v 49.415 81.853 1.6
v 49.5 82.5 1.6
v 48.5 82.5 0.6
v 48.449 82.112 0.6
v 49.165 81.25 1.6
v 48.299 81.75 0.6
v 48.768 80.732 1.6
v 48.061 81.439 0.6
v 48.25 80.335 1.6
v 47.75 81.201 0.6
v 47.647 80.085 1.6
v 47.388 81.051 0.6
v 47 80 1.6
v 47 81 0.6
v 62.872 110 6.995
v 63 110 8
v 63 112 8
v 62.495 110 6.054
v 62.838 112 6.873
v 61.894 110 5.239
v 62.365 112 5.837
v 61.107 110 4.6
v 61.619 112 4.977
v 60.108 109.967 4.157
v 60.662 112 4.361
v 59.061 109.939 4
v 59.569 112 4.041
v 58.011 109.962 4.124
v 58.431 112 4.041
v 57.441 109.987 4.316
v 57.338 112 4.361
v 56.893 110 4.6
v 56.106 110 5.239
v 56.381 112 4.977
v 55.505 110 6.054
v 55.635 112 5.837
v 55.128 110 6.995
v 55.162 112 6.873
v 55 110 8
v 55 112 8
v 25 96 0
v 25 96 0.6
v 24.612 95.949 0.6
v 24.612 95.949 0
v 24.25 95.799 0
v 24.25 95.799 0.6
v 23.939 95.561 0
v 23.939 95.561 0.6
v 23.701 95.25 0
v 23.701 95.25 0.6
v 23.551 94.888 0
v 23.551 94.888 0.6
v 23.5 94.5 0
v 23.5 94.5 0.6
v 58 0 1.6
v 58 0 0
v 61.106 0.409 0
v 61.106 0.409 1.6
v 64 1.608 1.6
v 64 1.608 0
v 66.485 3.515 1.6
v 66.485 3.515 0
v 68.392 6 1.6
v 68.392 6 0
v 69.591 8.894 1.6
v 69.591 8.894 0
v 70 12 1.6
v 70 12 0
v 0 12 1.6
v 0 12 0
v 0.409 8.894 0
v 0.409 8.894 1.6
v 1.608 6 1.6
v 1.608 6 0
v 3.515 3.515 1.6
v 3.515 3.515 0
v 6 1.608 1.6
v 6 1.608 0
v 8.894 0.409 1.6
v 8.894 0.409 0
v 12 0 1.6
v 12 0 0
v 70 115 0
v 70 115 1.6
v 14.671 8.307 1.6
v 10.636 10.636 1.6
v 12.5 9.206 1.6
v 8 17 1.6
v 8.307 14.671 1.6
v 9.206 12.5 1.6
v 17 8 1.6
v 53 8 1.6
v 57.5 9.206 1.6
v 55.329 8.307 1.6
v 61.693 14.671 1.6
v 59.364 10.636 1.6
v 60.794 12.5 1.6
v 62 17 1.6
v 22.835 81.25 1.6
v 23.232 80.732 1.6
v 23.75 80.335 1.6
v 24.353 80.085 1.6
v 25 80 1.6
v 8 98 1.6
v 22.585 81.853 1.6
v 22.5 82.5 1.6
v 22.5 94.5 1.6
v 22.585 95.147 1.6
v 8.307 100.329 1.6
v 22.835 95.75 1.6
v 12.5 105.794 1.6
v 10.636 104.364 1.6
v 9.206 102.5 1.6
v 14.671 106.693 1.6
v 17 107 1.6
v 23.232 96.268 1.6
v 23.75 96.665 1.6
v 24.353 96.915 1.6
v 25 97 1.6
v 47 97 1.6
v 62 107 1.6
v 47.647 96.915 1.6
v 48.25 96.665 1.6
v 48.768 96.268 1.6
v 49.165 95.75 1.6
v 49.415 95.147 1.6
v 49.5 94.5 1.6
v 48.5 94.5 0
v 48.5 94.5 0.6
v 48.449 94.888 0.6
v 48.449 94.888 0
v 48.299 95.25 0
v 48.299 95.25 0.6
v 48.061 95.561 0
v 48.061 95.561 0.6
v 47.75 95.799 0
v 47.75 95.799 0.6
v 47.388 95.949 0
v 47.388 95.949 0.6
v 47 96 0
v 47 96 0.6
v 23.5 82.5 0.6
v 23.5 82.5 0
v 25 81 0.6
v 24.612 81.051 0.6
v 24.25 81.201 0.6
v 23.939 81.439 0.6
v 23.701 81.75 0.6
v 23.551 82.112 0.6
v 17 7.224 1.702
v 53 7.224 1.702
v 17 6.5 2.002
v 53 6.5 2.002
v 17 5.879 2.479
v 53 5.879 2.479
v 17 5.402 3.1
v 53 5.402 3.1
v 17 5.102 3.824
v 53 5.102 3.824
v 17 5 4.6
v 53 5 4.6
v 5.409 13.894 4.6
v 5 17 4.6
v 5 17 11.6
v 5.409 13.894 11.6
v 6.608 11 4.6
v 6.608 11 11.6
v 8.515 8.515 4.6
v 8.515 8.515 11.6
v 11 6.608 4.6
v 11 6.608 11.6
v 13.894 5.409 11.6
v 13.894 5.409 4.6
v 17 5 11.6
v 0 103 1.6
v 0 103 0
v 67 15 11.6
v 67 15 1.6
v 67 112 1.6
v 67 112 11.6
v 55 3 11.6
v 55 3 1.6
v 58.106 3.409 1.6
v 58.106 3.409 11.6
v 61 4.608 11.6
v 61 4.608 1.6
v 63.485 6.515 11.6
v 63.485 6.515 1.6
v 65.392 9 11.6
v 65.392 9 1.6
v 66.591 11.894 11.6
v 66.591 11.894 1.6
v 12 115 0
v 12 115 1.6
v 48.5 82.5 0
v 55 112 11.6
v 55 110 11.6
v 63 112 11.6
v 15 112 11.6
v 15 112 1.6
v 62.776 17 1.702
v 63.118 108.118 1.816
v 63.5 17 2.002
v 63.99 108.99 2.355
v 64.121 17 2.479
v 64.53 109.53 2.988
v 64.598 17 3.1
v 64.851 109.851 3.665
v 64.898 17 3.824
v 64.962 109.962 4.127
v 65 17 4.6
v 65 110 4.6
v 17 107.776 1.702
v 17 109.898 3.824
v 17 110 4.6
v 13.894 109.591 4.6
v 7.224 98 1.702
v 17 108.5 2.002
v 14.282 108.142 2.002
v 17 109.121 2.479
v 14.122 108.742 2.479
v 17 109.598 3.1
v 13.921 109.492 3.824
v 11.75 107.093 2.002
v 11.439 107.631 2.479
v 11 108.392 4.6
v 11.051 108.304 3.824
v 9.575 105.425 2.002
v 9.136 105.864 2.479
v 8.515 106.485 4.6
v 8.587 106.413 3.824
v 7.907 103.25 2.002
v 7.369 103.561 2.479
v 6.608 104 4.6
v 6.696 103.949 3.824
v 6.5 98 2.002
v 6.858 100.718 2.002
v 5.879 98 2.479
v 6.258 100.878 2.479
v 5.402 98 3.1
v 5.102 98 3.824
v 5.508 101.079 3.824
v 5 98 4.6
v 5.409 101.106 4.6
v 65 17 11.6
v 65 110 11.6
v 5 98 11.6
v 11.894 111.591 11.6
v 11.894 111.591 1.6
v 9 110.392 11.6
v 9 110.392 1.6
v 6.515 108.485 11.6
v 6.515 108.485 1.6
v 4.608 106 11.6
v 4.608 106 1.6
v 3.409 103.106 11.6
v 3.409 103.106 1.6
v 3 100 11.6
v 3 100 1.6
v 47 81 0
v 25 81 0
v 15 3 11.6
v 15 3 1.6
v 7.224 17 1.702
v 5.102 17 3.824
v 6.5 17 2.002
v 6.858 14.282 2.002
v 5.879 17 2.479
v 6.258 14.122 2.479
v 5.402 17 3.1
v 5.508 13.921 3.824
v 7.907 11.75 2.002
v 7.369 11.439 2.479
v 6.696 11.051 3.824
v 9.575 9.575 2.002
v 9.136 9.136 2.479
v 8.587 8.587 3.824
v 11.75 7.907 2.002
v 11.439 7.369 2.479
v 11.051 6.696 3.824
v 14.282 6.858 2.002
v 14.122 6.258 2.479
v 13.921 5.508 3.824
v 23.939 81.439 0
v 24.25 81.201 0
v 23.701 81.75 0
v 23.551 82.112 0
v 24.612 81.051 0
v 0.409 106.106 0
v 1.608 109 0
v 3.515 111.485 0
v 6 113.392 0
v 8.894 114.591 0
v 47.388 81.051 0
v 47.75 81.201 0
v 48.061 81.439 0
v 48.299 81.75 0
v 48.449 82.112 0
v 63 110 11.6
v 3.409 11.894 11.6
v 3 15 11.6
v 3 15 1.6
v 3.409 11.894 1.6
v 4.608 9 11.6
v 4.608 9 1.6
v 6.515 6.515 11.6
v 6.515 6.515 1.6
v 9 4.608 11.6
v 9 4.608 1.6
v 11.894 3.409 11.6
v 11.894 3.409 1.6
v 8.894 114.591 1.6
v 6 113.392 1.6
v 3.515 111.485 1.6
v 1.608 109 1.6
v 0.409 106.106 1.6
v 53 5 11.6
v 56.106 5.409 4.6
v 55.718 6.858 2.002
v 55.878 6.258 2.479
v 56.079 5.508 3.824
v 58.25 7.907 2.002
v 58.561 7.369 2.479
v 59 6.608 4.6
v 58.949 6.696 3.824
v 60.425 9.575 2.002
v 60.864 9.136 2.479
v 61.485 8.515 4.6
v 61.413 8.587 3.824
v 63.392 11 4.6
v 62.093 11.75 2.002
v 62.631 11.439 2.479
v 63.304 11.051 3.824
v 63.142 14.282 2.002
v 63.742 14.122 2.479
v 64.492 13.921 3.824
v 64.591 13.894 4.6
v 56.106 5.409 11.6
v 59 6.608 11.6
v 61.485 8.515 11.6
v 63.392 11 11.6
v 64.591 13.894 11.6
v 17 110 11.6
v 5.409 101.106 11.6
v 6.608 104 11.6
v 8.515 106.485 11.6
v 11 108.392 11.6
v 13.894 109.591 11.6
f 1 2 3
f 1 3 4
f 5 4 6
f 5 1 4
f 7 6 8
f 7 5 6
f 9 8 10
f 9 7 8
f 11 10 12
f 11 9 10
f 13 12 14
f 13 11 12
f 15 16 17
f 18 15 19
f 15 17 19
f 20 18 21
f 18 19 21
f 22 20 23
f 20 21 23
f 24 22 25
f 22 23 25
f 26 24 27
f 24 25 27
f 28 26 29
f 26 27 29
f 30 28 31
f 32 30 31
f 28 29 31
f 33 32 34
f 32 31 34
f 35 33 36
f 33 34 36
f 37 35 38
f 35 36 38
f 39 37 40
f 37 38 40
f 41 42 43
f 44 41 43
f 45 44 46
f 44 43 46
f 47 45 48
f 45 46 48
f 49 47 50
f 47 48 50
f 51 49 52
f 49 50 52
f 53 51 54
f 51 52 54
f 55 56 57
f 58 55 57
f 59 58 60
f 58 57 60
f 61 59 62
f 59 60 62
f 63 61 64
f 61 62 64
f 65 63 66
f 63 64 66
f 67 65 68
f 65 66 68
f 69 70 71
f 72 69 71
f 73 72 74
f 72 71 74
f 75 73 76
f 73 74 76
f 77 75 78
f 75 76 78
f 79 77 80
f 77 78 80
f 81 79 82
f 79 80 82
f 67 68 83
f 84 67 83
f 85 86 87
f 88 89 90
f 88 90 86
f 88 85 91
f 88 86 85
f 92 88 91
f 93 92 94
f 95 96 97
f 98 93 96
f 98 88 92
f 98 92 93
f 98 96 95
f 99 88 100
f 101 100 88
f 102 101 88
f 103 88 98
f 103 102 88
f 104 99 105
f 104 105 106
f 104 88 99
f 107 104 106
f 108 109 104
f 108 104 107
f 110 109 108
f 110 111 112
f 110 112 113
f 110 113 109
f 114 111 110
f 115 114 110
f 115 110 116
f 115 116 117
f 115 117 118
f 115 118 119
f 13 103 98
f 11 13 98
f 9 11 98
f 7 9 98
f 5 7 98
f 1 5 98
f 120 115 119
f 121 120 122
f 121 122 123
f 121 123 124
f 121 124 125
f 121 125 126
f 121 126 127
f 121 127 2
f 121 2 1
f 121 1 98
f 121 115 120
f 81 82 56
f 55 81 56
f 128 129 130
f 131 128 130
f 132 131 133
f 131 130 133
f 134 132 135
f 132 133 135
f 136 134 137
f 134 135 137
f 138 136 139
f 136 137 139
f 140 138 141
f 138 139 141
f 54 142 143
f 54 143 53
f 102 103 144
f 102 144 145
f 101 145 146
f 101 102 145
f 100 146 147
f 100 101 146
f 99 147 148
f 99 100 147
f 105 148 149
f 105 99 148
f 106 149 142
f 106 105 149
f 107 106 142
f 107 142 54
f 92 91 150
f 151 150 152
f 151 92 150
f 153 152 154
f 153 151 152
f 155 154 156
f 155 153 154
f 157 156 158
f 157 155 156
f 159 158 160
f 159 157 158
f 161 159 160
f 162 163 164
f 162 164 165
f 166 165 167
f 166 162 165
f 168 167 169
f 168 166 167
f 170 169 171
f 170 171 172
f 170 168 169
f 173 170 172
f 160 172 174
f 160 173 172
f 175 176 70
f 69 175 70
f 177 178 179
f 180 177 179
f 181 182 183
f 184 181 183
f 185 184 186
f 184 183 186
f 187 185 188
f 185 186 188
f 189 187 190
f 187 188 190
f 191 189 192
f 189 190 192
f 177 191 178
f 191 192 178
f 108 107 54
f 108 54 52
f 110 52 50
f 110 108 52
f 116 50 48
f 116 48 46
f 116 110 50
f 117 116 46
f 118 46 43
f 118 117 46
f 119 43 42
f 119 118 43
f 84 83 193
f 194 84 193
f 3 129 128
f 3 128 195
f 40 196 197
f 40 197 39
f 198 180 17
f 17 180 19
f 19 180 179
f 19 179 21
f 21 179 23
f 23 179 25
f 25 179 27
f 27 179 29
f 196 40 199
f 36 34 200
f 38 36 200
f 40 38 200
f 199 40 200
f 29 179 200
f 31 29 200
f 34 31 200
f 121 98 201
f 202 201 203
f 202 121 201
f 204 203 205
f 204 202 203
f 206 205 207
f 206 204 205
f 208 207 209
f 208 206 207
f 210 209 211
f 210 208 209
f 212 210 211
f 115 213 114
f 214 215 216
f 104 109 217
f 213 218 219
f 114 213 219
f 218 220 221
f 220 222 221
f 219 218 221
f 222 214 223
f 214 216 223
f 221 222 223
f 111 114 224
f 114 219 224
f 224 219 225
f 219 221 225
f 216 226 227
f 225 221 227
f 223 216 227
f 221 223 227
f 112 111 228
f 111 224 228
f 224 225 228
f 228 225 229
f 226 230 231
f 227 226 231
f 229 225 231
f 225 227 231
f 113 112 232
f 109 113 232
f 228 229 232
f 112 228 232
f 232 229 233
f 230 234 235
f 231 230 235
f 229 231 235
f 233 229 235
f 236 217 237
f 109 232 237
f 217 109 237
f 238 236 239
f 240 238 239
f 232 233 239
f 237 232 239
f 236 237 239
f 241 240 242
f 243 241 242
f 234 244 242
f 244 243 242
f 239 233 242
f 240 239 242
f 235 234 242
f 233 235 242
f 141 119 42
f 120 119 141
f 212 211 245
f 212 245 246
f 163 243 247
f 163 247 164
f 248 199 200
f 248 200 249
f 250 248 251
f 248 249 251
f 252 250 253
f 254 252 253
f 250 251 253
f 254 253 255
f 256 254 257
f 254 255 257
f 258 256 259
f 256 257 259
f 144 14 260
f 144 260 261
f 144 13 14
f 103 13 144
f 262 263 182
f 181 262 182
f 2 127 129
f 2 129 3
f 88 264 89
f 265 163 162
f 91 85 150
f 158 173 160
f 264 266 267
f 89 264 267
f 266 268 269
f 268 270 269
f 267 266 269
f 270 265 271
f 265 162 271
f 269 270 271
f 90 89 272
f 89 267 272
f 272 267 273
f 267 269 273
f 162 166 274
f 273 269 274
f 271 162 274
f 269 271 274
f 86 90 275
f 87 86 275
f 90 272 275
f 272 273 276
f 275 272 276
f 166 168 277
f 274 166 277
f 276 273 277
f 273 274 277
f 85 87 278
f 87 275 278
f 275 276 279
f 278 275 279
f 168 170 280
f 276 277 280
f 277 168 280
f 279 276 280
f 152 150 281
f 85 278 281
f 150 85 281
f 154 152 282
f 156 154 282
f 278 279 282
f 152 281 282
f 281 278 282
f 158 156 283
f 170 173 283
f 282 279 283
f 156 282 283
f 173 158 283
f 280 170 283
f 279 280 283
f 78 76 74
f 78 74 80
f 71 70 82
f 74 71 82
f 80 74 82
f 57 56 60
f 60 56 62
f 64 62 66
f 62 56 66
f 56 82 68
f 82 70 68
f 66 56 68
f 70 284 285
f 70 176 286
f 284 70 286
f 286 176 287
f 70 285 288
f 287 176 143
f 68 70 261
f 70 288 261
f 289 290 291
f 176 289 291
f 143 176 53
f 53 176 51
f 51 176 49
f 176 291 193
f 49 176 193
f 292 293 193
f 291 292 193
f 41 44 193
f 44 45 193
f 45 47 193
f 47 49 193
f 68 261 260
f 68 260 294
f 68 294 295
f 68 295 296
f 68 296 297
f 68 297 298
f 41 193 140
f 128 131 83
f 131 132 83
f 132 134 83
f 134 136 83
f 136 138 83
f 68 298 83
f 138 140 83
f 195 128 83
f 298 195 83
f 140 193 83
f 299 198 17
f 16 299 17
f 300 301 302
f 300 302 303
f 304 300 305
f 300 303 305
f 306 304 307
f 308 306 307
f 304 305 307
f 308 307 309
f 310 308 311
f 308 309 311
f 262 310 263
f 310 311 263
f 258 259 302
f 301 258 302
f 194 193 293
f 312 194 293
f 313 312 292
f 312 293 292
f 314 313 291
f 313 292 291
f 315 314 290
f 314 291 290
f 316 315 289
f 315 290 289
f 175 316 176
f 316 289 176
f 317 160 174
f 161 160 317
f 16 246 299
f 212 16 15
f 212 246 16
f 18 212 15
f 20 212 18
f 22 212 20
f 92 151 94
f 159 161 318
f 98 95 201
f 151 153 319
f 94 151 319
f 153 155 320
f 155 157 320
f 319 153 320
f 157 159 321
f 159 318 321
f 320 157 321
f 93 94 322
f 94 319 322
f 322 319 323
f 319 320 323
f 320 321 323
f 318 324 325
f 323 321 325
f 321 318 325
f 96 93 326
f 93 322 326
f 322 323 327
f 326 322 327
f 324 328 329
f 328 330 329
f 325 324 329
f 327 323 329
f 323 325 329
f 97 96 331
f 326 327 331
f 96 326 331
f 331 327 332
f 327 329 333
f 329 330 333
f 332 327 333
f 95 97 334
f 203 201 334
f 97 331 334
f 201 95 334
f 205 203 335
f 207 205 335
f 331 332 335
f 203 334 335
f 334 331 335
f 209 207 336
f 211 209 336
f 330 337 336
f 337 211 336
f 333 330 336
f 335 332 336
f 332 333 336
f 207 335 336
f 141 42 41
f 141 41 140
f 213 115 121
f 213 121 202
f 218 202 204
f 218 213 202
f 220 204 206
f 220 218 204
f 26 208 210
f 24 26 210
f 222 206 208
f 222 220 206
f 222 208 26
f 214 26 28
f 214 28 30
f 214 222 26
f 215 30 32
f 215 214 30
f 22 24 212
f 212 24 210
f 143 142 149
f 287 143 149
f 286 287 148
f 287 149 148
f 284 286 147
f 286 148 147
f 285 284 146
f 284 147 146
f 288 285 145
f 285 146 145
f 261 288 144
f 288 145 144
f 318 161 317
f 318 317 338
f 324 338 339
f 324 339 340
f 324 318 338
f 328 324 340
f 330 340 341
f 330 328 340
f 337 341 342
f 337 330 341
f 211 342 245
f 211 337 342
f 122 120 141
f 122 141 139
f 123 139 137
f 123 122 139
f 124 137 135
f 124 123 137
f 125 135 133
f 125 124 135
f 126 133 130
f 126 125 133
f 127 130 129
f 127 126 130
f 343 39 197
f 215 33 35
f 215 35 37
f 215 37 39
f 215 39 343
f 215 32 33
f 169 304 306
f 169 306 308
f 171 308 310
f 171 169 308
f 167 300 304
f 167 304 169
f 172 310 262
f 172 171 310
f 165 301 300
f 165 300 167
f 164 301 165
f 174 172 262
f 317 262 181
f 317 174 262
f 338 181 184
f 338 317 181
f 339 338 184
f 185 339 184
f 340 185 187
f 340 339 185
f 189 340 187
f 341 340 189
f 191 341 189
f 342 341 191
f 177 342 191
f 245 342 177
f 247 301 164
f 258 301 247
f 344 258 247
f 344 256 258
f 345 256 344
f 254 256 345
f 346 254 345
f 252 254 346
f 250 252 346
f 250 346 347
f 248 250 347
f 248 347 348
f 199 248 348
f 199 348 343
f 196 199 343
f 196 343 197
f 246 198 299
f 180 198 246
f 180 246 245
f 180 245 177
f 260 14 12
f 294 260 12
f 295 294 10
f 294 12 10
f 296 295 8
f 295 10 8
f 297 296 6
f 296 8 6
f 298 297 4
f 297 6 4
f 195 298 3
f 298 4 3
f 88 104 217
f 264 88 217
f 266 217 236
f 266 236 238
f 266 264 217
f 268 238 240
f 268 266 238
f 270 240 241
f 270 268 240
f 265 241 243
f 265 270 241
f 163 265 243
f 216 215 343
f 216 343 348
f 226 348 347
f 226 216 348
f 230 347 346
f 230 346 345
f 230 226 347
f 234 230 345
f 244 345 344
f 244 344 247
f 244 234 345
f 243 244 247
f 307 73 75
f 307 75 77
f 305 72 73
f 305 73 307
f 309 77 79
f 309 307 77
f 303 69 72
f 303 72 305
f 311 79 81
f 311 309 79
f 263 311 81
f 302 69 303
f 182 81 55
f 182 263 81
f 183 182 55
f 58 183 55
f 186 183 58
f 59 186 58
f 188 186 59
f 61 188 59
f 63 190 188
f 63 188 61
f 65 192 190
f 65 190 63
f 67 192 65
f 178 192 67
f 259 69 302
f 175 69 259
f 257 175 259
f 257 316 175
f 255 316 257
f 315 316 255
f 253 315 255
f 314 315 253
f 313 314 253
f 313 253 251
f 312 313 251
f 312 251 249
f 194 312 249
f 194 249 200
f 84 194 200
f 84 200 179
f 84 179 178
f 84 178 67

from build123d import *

# Parameters (mm, degrees)
PAD_DEPTH       = 1.6
PAD001_DEPTH    = 10
SKETCH004_R     = 1
POCKET_DEPTH    = 67.001
POCKET001_DEPTH = 5
CHAMFER_SIZE    = 1
FILLET_R        = 3
POCKET002_DEPTH = 5


with BuildPart() as part:
    # Sketch → Pad (new body)
    with BuildSketch(Plane.XY):
        with BuildLine():
            Line((12, 0), (58, 0))
            ThreePointArc((58, 0), (66.485281, 3.514719), (70, 12))
            Line((70, 12), (70, 115))
            Line((70, 115), (12, 115))
            ThreePointArc((12, 115), (3.514719, 111.485281), (0, 103))
            Line((0, 103), (0, 12))
            ThreePointArc((0, 12), (3.514719, 3.514719), (12, 0))
        make_face()
    extrude(amount=PAD_DEPTH)

    # Sketch001 → Pad001 (new body)
    with BuildSketch(Plane.XY.offset(1.6)):
        with BuildLine():
            Line((15, 3), (55, 3))
            ThreePointArc((55, 3), (63.485281, 6.514719), (67, 15))
            Line((67, 15), (67, 112))
            Line((67, 112), (15, 112))
            ThreePointArc((15, 112), (6.514719, 108.485281), (3, 100))
            Line((3, 100), (3, 15))
            ThreePointArc((3, 15), (6.514719, 6.514719), (15, 3))
        make_face()
        with BuildLine():
            Line((17, 5), (53, 5))
            ThreePointArc((53, 5), (61.485281, 8.514719), (65, 17))
            Line((65, 17), (65, 110))
            Line((65, 110), (17, 110))
            ThreePointArc((17, 110), (8.514719, 106.485281), (5, 98))
            Line((5, 98), (5, 17))
            ThreePointArc((5, 17), (8.514719, 8.514719), (17, 5))
        make_face(mode=Mode.SUBTRACT)
    extrude(amount=PAD001_DEPTH)

    # Sketch004 → Pocket (cut, through all)
    with BuildSketch(Plane.YZ.offset(67)):
        with Locations((-62, 7.1)):
            Circle(SKETCH004_R)
    extrude(amount=-POCKET_DEPTH, mode=Mode.SUBTRACT)

    # Sketch005 → Pocket001 (cut)
    with BuildSketch(Plane.XY.offset(1.6)):
        with BuildLine():
            Line((25, 96), (47, 96))
            ThreePointArc((48.5, 94.5), (48.06066, 95.56066), (47, 96))
            Line((48.5, 94.5), (48.5, 82.5))
            ThreePointArc((47, 81), (48.06066, 81.43934), (48.5, 82.5))
            Line((47, 81), (25, 81))
            ThreePointArc((23.5, 82.5), (23.93934, 81.43934), (25, 81))
            Line((23.5, 82.5), (23.5, 94.5))
            ThreePointArc((25, 96), (23.93934, 95.56066), (23.5, 94.5))
        make_face()
    extrude(amount=-POCKET001_DEPTH, mode=Mode.SUBTRACT)

    # Chamfer
    chamfer_edges = [part.edges().sort_by_distance(p)[0] for p in [
        (48.5, 88.5, 1.6),
        (48.06066, 95.56066, 1.6),
        (36, 96, 1.6),
        (23.93934, 95.56066, 1.6),
        (23.5, 88.5, 1.6),
        (23.93934, 81.43934, 1.6),
        (36, 81, 1.6),
        (48.06066, 81.43934, 1.6),
    ]]
    chamfer(chamfer_edges, length=CHAMFER_SIZE)

    # Fillet
    fillet_edges = [part.edges().sort_by_distance(p)[0] for p in [
        (41, 110, 1.6),
        (8.514719, 106.485281, 1.6),
        (65, 63.5, 1.6),
        (5, 57.5, 1.6),
        (8.514719, 8.514719, 1.6),
        (35, 5, 1.6),
    ]]
    fillet(fillet_edges, radius=FILLET_R)

    # Sketch006 → Pocket002 (cut)
    with BuildSketch(Plane(origin=(0, 112, 0), x_dir=(-1, 0, 0), z_dir=(0, 1, 0))):
        with BuildLine():
            ThreePointArc((-55, 18), (-59, 22), (-63, 18))
            Line((-63, 18), (-63, 8))
            ThreePointArc((-63, 8), (-59, 4), (-55, 8))
            Line((-55, 18), (-55, 8))
        make_face()
    extrude(amount=-POCKET002_DEPTH, mode=Mode.SUBTRACT)


solid = part.part
